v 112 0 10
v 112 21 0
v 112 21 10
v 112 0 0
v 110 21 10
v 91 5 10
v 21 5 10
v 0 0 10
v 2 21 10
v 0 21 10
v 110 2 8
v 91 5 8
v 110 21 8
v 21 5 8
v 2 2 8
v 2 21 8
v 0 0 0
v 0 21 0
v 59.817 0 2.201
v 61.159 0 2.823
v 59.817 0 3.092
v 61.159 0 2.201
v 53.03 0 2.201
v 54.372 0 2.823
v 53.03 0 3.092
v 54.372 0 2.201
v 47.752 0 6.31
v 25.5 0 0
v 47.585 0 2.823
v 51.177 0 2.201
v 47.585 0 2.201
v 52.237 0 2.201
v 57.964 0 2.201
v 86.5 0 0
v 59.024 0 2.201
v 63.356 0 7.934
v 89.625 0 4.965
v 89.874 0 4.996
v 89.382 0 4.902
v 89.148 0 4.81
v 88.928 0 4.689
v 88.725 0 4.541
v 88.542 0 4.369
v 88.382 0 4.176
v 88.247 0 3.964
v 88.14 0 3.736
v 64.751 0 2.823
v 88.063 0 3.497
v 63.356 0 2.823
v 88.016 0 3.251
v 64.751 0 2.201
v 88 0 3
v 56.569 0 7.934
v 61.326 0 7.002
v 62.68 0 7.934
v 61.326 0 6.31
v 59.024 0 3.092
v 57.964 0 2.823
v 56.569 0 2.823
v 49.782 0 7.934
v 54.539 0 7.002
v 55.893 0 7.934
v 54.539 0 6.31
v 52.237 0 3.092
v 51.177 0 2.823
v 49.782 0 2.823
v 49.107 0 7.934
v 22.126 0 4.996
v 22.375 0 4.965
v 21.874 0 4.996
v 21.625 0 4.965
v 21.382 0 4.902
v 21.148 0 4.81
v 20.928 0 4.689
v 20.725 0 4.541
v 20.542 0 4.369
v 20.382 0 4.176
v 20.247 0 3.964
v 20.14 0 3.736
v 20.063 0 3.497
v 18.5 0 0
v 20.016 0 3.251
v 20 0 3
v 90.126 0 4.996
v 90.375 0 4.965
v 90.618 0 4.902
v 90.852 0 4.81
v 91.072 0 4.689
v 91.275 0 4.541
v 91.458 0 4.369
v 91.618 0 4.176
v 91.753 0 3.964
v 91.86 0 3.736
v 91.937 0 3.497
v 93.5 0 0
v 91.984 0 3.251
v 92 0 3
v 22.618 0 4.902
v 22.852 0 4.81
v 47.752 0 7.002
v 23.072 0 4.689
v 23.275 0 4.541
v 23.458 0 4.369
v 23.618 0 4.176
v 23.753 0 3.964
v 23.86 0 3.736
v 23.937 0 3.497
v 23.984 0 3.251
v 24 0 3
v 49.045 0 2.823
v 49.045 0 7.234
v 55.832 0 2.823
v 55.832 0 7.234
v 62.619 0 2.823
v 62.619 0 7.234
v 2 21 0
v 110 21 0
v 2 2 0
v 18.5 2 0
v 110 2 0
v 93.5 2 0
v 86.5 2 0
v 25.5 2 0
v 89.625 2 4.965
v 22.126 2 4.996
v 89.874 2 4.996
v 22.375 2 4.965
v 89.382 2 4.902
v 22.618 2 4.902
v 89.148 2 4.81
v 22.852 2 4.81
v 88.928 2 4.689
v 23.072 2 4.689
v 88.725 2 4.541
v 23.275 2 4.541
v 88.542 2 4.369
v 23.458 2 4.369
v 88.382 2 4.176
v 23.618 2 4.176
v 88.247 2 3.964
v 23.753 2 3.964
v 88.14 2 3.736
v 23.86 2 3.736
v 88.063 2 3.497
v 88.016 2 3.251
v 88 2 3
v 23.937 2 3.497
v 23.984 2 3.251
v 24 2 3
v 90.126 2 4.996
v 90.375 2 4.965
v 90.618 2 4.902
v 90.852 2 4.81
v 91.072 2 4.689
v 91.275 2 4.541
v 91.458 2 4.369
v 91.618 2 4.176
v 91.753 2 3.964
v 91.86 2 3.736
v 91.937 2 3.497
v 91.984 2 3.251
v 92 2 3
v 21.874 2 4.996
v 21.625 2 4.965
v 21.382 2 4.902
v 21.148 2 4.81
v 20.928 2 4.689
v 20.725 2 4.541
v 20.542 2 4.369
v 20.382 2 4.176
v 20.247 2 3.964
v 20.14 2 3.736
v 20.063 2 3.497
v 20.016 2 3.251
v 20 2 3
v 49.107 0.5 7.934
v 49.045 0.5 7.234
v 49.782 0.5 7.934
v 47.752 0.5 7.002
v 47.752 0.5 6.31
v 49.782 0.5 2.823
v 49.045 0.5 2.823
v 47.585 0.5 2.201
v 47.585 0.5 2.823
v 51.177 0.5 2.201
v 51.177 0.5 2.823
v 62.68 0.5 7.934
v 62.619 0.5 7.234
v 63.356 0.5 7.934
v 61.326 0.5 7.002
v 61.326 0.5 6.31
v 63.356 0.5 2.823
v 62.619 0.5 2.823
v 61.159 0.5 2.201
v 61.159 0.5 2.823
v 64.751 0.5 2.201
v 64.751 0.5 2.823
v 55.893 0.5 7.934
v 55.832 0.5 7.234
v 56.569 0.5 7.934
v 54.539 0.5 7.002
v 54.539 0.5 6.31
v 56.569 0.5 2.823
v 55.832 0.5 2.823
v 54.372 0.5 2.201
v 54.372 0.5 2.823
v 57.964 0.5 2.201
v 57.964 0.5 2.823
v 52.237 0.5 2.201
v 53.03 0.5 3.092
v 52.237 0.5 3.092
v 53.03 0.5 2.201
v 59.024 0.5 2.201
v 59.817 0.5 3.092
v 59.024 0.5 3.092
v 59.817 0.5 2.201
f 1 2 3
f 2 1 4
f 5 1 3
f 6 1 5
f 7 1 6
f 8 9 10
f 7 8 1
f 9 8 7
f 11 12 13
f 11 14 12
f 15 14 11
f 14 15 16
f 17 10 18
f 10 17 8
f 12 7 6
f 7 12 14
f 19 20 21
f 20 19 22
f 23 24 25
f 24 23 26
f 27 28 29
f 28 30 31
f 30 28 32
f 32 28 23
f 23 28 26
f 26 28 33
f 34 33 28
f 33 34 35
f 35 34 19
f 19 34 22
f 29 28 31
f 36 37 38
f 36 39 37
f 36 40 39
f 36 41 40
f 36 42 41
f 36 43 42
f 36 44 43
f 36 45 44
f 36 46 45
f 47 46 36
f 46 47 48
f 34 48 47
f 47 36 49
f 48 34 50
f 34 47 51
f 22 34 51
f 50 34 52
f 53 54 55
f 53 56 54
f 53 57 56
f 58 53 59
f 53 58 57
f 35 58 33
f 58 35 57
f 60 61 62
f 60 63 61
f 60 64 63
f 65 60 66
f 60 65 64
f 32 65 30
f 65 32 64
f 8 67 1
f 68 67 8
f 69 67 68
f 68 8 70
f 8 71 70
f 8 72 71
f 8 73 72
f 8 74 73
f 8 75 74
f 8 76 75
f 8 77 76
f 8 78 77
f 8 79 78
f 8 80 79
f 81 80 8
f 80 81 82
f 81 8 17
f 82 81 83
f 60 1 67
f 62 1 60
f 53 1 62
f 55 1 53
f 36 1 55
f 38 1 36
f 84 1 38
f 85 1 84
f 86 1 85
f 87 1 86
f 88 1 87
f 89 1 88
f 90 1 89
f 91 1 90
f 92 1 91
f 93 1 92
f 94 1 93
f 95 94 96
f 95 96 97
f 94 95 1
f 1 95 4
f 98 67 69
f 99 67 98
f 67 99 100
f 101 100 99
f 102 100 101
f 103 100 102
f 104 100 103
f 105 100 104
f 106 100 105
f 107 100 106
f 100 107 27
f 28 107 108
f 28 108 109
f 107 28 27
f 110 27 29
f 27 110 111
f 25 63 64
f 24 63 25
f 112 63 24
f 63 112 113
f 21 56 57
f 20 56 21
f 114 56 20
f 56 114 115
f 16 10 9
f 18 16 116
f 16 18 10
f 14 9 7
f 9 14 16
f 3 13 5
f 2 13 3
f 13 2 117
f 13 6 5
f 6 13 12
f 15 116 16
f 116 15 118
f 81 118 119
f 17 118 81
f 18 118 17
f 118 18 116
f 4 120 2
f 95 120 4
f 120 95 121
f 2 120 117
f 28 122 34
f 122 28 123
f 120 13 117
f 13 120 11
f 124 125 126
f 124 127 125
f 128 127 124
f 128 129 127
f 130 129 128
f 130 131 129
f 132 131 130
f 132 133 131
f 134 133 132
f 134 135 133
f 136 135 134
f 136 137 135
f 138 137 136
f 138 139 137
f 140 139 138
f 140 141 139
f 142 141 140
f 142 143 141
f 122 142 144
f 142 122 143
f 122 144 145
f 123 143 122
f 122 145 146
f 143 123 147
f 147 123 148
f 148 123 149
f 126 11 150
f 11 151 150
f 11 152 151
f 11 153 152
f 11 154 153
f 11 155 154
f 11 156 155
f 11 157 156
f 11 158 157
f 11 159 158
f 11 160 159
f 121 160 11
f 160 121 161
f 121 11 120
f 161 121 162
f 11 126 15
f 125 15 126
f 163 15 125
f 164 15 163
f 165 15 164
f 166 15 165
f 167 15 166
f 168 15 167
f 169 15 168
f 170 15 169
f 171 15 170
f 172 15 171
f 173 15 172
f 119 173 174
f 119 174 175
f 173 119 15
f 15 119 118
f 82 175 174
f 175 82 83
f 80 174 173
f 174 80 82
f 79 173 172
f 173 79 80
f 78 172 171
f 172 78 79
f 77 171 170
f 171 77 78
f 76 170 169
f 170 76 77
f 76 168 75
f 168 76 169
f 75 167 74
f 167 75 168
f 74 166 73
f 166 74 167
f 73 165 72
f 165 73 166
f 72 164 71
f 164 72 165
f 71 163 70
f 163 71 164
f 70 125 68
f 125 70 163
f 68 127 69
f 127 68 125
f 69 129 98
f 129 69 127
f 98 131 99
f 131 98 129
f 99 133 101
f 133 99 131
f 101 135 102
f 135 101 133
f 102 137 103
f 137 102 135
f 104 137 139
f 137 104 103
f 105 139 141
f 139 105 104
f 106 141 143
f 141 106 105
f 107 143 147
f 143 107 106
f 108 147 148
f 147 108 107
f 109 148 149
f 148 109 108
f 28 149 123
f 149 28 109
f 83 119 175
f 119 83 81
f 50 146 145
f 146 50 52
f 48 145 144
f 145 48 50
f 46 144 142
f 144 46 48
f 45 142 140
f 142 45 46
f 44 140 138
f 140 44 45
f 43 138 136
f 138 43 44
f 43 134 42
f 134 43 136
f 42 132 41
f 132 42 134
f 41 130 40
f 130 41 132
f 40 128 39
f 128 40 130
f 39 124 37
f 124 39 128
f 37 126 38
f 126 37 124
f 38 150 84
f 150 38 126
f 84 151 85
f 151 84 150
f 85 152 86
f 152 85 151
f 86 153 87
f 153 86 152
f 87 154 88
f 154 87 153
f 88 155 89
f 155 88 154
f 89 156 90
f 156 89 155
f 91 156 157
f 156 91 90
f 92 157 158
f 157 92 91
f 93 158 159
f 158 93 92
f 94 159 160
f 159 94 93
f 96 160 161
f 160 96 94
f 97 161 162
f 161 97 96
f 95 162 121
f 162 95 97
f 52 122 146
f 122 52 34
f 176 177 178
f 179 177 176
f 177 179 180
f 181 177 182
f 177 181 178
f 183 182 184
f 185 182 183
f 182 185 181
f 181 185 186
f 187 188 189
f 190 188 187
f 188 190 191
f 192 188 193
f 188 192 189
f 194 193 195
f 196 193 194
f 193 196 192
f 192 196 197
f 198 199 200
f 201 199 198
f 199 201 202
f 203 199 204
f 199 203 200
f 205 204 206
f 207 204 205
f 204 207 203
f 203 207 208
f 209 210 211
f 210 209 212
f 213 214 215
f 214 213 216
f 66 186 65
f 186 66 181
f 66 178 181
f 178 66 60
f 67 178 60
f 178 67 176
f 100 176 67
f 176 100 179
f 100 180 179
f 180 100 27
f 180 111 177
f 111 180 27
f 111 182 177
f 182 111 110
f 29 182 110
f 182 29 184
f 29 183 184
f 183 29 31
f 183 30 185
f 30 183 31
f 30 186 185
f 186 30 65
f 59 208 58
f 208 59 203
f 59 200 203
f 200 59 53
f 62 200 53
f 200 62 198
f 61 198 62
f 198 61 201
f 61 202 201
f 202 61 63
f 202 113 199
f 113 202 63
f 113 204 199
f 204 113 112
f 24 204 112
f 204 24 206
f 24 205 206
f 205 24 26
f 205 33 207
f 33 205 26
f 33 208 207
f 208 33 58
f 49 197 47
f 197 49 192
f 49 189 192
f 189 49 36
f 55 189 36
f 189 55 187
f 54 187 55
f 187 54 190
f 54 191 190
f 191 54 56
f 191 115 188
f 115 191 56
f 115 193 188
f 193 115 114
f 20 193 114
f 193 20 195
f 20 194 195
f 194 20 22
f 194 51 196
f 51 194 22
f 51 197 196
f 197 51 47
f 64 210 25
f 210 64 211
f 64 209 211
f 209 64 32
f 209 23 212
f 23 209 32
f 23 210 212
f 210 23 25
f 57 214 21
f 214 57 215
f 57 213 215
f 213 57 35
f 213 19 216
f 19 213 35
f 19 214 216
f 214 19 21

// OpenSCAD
$fn=50;

version = "1.1.1";

width = 112; // the horizontal dimension of the face (X)
height = 10; // the vertical dimension of the face (Z)
depth = 21;  // the lenght of the wings (Y)
inset = 22;
shellThickness = 2;


keyRadius = 2;
keyHeight = 4;

difference() {   
union() {
// top
translate([0,0, height - shellThickness]) 
    cube ([width, 5, shellThickness]);

//lhs top corner
translate([0,0,height - shellThickness])
topCorner();

//rhs top corner
translate([width,0,height - shellThickness])
mirror([1,0,0])
topCorner();

// side
//translate([0,0, height-depth]) 
cube ([ shellThickness, depth, height]);

// side
translate([width-shellThickness,0, 0]) 
cube ([ shellThickness, depth, height]);

//face
rotate([90, 0,0])
translate([0, 0, -shellThickness]) 
cube ([width, height, shellThickness]);
}


translate([22, -1, keyHeight-1]) keyhole();
translate([width-22, -1, keyHeight-1]) keyhole();
versionNumber();
}


module topCorner() {
    linear_extrude(shellThickness)
    polygon (
            [
                [0,0],
                [0,depth],
                [shellThickness,depth],
                [depth, 5],
                [depth, 0]
            ]
        );
}

module versionNumber() {
    translate([width/2, 0.5,height/2])
    rotate([90,0,0])
    linear_extrude (1) {
    text(version, , 6, halign = "center", valign = "center");
    }
}

module keyhole() {

    rotate([-90, 0,0]) 
    linear_extrude(shellThickness + 2)
    union() {
    circle (r=keyRadius);
    translate([keyRadius, 0,0])
        polygon (
            [
                [0,0],
                [-(keyRadius + 1),0],
                [-keyRadius,keyHeight],
                [keyRadius,keyHeight]
            ]
        );

    translate([-keyRadius, 0,0])
        polygon ([
            [0,0],
            [(keyRadius + 1),0]    ,
            [(keyRadius + 1),keyHeight],
            [-keyRadius,keyHeight]
        ]
        );
    }

} // end keyhole module
